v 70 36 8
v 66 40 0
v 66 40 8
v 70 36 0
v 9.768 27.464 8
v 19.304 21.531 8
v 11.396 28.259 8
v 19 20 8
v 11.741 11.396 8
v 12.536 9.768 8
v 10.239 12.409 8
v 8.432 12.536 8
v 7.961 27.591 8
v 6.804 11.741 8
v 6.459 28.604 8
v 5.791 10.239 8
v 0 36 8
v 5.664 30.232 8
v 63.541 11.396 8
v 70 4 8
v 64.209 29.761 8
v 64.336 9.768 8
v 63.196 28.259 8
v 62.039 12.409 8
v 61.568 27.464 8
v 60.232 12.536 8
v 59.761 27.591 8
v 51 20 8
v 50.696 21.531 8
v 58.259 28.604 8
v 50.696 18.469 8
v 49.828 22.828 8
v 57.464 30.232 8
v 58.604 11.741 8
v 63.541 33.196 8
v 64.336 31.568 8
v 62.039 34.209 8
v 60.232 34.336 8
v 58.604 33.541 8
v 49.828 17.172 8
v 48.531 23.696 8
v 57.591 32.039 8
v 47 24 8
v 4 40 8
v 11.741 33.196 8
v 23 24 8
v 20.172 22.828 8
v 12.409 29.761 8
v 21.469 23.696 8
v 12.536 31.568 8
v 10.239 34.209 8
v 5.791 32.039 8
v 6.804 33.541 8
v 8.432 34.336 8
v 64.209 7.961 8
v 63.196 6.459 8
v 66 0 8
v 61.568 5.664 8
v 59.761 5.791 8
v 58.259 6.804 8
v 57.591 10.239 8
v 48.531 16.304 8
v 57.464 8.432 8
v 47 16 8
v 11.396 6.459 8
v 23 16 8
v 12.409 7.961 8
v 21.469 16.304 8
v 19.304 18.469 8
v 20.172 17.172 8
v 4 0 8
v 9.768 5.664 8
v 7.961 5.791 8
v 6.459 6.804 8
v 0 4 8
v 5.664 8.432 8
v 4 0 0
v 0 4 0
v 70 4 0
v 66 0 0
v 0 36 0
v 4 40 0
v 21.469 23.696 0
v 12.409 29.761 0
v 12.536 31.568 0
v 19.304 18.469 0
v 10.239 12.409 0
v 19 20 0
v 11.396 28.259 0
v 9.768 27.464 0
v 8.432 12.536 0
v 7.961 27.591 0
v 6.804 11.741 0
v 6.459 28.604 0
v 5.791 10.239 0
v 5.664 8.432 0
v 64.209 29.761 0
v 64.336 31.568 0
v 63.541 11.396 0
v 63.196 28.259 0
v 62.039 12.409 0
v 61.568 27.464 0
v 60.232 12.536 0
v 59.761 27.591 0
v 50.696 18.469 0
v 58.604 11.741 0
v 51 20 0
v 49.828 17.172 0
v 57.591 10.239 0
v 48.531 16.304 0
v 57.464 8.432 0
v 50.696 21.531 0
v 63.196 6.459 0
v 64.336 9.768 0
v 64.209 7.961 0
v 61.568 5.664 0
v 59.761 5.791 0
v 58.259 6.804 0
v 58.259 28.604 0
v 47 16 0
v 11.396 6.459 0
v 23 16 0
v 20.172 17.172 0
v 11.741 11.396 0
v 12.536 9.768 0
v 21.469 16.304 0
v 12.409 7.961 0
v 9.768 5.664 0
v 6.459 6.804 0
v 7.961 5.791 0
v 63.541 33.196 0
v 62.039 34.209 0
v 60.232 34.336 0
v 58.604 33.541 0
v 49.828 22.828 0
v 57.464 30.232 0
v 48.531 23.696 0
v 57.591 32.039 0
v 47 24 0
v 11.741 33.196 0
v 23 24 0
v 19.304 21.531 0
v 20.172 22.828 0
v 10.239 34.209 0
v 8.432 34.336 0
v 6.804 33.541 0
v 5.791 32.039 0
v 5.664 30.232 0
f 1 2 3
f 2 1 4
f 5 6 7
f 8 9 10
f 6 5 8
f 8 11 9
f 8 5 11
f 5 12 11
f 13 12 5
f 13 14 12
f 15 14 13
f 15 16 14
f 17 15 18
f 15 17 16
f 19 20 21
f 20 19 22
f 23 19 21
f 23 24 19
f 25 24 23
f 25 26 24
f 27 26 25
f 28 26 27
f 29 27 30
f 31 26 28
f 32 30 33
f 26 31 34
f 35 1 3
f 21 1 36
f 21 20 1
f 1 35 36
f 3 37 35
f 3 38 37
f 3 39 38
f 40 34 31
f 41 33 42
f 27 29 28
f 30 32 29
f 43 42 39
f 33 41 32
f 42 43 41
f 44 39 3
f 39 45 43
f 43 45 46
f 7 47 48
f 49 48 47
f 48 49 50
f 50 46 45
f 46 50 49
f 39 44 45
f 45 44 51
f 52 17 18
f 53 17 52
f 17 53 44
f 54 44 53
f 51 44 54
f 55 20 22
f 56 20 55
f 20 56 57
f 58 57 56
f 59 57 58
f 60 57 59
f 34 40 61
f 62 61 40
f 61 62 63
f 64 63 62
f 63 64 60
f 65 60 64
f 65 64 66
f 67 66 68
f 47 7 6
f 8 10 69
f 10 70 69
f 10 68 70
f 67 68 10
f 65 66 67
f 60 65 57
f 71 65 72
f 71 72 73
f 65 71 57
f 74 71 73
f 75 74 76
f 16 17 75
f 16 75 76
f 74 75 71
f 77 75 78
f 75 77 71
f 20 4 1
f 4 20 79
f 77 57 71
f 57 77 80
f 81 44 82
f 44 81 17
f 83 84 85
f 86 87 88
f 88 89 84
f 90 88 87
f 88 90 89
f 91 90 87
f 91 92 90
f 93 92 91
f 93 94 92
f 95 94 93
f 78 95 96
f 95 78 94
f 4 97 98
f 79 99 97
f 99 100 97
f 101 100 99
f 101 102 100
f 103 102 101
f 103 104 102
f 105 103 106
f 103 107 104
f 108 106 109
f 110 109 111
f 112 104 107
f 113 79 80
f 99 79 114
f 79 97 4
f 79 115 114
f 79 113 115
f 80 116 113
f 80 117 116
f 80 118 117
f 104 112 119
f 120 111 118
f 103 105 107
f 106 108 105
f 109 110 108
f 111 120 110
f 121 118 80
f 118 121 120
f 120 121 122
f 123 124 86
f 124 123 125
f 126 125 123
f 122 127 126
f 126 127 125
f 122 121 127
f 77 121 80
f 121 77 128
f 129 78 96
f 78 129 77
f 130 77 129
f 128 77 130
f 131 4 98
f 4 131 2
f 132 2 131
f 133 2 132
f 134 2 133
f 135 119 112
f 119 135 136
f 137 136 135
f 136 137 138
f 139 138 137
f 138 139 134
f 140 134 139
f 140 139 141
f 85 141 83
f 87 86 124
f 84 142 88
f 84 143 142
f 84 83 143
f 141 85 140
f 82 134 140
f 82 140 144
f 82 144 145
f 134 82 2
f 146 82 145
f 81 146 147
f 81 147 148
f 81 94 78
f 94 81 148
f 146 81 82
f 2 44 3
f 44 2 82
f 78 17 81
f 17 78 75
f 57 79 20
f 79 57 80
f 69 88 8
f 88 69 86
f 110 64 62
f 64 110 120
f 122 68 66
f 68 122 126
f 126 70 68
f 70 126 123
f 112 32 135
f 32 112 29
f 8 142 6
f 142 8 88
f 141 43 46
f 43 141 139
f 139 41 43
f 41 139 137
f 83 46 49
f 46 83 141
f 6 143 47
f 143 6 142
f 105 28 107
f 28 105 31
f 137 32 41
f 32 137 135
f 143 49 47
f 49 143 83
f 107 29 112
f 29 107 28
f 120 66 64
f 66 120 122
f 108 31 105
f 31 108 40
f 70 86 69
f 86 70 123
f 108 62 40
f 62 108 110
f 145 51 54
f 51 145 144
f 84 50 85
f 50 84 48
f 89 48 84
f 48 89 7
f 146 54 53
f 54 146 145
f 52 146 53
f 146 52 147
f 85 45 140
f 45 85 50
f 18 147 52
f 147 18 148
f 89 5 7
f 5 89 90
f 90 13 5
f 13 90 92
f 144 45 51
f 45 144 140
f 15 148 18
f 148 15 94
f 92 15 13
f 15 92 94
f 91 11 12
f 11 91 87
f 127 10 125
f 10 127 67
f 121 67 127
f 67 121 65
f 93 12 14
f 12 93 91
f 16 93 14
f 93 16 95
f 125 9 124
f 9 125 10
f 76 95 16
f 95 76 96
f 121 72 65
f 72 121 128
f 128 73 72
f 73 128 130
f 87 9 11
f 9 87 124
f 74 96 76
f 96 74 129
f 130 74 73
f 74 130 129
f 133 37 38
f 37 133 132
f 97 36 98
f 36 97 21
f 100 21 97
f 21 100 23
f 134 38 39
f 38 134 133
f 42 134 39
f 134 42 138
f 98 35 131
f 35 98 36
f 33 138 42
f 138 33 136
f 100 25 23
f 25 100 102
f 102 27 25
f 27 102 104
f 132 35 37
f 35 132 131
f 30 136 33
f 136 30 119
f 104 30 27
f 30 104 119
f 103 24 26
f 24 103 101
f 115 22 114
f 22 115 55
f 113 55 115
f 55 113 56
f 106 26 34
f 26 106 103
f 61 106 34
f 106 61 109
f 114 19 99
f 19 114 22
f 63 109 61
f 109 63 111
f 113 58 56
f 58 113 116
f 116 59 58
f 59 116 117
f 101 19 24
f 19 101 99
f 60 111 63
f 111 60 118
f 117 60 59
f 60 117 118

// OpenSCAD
$fn = 32;

// ----------------------------------------------------------------------
// Bracket plate: slot plate 70 x 40
// ----------------------------------------------------------------------

// --- parameters (mm) ---
hole_r = 3.5;             // bolt hole radius
plate_t = 8;              // plate thickness, Z (extrusion height)
plate_l = 70;             // plate length
plate_w = 40;             // plate width
slot_l = 24;              // slot straight length
slot_r = 4;               // slot end radius
fit_tol = 0.05;           // declared fit tolerance (prompt contract)
free_tol = 0.3;           // declared free tolerance (prompt contract)

slot_len = slot_l + 2 * slot_r;
slot_w = 2 * slot_r;
hole_d2 = 2 * hole_r;

profile = [[4, 0], [66, 0], [70, 4], [70, 36], [66, 40], [4, 40], [0, 36], [0, 4]];  // primary outline, 8 points, counter clockwise
void_1 = [[47, 16], [48.531, 16.304], [49.828, 17.172], [50.696, 18.469], [51, 20], [50.696, 21.531], [49.828, 22.828], [48.531, 23.696], [47, 24], [23, 24], [21.469, 23.696], [20.172, 22.828], [19.304, 21.531], [19, 20], [19.304, 18.469], [20.172, 17.172], [21.469, 16.304], [23, 16]];  // grip slot, 18 points
void_2 = [[12.536, 31.568], [11.741, 33.196], [10.239, 34.209], [8.432, 34.336], [6.804, 33.541], [5.791, 32.039], [5.664, 30.232], [6.459, 28.604], [7.961, 27.591], [9.768, 27.464], [11.396, 28.259], [12.409, 29.761]];  // corner hole, 12 points
void_3 = [[12.536, 9.768], [11.741, 11.396], [10.239, 12.409], [8.432, 12.536], [6.804, 11.741], [5.791, 10.239], [5.664, 8.432], [6.459, 6.804], [7.961, 5.791], [9.768, 5.664], [11.396, 6.459], [12.409, 7.961]];  // corner hole, 12 points
void_4 = [[64.336, 31.568], [63.541, 33.196], [62.039, 34.209], [60.232, 34.336], [58.604, 33.541], [57.591, 32.039], [57.464, 30.232], [58.259, 28.604], [59.761, 27.591], [61.568, 27.464], [63.196, 28.259], [64.209, 29.761]];  // corner hole, 12 points
void_5 = [[64.336, 9.768], [63.541, 11.396], [62.039, 12.409], [60.232, 12.536], [58.604, 11.741], [57.591, 10.239], [57.464, 8.432], [58.259, 6.804], [59.761, 5.791], [61.568, 5.664], [63.196, 6.459], [64.209, 7.961]];  // corner hole, 12 points

// --- the one profile operation ---
difference() {
  linear_extrude(height = plate_t) polygon(points = profile);
  translate([0, 0, -1])
    linear_extrude(height = plate_t + 2) polygon(points = void_1);
  translate([0, 0, -1])
    linear_extrude(height = plate_t + 2) polygon(points = void_2);
  translate([0, 0, -1])
    linear_extrude(height = plate_t + 2) polygon(points = void_3);
  translate([0, 0, -1])
    linear_extrude(height = plate_t + 2) polygon(points = void_4);
  translate([0, 0, -1])
    linear_extrude(height = plate_t + 2) polygon(points = void_5);
}
